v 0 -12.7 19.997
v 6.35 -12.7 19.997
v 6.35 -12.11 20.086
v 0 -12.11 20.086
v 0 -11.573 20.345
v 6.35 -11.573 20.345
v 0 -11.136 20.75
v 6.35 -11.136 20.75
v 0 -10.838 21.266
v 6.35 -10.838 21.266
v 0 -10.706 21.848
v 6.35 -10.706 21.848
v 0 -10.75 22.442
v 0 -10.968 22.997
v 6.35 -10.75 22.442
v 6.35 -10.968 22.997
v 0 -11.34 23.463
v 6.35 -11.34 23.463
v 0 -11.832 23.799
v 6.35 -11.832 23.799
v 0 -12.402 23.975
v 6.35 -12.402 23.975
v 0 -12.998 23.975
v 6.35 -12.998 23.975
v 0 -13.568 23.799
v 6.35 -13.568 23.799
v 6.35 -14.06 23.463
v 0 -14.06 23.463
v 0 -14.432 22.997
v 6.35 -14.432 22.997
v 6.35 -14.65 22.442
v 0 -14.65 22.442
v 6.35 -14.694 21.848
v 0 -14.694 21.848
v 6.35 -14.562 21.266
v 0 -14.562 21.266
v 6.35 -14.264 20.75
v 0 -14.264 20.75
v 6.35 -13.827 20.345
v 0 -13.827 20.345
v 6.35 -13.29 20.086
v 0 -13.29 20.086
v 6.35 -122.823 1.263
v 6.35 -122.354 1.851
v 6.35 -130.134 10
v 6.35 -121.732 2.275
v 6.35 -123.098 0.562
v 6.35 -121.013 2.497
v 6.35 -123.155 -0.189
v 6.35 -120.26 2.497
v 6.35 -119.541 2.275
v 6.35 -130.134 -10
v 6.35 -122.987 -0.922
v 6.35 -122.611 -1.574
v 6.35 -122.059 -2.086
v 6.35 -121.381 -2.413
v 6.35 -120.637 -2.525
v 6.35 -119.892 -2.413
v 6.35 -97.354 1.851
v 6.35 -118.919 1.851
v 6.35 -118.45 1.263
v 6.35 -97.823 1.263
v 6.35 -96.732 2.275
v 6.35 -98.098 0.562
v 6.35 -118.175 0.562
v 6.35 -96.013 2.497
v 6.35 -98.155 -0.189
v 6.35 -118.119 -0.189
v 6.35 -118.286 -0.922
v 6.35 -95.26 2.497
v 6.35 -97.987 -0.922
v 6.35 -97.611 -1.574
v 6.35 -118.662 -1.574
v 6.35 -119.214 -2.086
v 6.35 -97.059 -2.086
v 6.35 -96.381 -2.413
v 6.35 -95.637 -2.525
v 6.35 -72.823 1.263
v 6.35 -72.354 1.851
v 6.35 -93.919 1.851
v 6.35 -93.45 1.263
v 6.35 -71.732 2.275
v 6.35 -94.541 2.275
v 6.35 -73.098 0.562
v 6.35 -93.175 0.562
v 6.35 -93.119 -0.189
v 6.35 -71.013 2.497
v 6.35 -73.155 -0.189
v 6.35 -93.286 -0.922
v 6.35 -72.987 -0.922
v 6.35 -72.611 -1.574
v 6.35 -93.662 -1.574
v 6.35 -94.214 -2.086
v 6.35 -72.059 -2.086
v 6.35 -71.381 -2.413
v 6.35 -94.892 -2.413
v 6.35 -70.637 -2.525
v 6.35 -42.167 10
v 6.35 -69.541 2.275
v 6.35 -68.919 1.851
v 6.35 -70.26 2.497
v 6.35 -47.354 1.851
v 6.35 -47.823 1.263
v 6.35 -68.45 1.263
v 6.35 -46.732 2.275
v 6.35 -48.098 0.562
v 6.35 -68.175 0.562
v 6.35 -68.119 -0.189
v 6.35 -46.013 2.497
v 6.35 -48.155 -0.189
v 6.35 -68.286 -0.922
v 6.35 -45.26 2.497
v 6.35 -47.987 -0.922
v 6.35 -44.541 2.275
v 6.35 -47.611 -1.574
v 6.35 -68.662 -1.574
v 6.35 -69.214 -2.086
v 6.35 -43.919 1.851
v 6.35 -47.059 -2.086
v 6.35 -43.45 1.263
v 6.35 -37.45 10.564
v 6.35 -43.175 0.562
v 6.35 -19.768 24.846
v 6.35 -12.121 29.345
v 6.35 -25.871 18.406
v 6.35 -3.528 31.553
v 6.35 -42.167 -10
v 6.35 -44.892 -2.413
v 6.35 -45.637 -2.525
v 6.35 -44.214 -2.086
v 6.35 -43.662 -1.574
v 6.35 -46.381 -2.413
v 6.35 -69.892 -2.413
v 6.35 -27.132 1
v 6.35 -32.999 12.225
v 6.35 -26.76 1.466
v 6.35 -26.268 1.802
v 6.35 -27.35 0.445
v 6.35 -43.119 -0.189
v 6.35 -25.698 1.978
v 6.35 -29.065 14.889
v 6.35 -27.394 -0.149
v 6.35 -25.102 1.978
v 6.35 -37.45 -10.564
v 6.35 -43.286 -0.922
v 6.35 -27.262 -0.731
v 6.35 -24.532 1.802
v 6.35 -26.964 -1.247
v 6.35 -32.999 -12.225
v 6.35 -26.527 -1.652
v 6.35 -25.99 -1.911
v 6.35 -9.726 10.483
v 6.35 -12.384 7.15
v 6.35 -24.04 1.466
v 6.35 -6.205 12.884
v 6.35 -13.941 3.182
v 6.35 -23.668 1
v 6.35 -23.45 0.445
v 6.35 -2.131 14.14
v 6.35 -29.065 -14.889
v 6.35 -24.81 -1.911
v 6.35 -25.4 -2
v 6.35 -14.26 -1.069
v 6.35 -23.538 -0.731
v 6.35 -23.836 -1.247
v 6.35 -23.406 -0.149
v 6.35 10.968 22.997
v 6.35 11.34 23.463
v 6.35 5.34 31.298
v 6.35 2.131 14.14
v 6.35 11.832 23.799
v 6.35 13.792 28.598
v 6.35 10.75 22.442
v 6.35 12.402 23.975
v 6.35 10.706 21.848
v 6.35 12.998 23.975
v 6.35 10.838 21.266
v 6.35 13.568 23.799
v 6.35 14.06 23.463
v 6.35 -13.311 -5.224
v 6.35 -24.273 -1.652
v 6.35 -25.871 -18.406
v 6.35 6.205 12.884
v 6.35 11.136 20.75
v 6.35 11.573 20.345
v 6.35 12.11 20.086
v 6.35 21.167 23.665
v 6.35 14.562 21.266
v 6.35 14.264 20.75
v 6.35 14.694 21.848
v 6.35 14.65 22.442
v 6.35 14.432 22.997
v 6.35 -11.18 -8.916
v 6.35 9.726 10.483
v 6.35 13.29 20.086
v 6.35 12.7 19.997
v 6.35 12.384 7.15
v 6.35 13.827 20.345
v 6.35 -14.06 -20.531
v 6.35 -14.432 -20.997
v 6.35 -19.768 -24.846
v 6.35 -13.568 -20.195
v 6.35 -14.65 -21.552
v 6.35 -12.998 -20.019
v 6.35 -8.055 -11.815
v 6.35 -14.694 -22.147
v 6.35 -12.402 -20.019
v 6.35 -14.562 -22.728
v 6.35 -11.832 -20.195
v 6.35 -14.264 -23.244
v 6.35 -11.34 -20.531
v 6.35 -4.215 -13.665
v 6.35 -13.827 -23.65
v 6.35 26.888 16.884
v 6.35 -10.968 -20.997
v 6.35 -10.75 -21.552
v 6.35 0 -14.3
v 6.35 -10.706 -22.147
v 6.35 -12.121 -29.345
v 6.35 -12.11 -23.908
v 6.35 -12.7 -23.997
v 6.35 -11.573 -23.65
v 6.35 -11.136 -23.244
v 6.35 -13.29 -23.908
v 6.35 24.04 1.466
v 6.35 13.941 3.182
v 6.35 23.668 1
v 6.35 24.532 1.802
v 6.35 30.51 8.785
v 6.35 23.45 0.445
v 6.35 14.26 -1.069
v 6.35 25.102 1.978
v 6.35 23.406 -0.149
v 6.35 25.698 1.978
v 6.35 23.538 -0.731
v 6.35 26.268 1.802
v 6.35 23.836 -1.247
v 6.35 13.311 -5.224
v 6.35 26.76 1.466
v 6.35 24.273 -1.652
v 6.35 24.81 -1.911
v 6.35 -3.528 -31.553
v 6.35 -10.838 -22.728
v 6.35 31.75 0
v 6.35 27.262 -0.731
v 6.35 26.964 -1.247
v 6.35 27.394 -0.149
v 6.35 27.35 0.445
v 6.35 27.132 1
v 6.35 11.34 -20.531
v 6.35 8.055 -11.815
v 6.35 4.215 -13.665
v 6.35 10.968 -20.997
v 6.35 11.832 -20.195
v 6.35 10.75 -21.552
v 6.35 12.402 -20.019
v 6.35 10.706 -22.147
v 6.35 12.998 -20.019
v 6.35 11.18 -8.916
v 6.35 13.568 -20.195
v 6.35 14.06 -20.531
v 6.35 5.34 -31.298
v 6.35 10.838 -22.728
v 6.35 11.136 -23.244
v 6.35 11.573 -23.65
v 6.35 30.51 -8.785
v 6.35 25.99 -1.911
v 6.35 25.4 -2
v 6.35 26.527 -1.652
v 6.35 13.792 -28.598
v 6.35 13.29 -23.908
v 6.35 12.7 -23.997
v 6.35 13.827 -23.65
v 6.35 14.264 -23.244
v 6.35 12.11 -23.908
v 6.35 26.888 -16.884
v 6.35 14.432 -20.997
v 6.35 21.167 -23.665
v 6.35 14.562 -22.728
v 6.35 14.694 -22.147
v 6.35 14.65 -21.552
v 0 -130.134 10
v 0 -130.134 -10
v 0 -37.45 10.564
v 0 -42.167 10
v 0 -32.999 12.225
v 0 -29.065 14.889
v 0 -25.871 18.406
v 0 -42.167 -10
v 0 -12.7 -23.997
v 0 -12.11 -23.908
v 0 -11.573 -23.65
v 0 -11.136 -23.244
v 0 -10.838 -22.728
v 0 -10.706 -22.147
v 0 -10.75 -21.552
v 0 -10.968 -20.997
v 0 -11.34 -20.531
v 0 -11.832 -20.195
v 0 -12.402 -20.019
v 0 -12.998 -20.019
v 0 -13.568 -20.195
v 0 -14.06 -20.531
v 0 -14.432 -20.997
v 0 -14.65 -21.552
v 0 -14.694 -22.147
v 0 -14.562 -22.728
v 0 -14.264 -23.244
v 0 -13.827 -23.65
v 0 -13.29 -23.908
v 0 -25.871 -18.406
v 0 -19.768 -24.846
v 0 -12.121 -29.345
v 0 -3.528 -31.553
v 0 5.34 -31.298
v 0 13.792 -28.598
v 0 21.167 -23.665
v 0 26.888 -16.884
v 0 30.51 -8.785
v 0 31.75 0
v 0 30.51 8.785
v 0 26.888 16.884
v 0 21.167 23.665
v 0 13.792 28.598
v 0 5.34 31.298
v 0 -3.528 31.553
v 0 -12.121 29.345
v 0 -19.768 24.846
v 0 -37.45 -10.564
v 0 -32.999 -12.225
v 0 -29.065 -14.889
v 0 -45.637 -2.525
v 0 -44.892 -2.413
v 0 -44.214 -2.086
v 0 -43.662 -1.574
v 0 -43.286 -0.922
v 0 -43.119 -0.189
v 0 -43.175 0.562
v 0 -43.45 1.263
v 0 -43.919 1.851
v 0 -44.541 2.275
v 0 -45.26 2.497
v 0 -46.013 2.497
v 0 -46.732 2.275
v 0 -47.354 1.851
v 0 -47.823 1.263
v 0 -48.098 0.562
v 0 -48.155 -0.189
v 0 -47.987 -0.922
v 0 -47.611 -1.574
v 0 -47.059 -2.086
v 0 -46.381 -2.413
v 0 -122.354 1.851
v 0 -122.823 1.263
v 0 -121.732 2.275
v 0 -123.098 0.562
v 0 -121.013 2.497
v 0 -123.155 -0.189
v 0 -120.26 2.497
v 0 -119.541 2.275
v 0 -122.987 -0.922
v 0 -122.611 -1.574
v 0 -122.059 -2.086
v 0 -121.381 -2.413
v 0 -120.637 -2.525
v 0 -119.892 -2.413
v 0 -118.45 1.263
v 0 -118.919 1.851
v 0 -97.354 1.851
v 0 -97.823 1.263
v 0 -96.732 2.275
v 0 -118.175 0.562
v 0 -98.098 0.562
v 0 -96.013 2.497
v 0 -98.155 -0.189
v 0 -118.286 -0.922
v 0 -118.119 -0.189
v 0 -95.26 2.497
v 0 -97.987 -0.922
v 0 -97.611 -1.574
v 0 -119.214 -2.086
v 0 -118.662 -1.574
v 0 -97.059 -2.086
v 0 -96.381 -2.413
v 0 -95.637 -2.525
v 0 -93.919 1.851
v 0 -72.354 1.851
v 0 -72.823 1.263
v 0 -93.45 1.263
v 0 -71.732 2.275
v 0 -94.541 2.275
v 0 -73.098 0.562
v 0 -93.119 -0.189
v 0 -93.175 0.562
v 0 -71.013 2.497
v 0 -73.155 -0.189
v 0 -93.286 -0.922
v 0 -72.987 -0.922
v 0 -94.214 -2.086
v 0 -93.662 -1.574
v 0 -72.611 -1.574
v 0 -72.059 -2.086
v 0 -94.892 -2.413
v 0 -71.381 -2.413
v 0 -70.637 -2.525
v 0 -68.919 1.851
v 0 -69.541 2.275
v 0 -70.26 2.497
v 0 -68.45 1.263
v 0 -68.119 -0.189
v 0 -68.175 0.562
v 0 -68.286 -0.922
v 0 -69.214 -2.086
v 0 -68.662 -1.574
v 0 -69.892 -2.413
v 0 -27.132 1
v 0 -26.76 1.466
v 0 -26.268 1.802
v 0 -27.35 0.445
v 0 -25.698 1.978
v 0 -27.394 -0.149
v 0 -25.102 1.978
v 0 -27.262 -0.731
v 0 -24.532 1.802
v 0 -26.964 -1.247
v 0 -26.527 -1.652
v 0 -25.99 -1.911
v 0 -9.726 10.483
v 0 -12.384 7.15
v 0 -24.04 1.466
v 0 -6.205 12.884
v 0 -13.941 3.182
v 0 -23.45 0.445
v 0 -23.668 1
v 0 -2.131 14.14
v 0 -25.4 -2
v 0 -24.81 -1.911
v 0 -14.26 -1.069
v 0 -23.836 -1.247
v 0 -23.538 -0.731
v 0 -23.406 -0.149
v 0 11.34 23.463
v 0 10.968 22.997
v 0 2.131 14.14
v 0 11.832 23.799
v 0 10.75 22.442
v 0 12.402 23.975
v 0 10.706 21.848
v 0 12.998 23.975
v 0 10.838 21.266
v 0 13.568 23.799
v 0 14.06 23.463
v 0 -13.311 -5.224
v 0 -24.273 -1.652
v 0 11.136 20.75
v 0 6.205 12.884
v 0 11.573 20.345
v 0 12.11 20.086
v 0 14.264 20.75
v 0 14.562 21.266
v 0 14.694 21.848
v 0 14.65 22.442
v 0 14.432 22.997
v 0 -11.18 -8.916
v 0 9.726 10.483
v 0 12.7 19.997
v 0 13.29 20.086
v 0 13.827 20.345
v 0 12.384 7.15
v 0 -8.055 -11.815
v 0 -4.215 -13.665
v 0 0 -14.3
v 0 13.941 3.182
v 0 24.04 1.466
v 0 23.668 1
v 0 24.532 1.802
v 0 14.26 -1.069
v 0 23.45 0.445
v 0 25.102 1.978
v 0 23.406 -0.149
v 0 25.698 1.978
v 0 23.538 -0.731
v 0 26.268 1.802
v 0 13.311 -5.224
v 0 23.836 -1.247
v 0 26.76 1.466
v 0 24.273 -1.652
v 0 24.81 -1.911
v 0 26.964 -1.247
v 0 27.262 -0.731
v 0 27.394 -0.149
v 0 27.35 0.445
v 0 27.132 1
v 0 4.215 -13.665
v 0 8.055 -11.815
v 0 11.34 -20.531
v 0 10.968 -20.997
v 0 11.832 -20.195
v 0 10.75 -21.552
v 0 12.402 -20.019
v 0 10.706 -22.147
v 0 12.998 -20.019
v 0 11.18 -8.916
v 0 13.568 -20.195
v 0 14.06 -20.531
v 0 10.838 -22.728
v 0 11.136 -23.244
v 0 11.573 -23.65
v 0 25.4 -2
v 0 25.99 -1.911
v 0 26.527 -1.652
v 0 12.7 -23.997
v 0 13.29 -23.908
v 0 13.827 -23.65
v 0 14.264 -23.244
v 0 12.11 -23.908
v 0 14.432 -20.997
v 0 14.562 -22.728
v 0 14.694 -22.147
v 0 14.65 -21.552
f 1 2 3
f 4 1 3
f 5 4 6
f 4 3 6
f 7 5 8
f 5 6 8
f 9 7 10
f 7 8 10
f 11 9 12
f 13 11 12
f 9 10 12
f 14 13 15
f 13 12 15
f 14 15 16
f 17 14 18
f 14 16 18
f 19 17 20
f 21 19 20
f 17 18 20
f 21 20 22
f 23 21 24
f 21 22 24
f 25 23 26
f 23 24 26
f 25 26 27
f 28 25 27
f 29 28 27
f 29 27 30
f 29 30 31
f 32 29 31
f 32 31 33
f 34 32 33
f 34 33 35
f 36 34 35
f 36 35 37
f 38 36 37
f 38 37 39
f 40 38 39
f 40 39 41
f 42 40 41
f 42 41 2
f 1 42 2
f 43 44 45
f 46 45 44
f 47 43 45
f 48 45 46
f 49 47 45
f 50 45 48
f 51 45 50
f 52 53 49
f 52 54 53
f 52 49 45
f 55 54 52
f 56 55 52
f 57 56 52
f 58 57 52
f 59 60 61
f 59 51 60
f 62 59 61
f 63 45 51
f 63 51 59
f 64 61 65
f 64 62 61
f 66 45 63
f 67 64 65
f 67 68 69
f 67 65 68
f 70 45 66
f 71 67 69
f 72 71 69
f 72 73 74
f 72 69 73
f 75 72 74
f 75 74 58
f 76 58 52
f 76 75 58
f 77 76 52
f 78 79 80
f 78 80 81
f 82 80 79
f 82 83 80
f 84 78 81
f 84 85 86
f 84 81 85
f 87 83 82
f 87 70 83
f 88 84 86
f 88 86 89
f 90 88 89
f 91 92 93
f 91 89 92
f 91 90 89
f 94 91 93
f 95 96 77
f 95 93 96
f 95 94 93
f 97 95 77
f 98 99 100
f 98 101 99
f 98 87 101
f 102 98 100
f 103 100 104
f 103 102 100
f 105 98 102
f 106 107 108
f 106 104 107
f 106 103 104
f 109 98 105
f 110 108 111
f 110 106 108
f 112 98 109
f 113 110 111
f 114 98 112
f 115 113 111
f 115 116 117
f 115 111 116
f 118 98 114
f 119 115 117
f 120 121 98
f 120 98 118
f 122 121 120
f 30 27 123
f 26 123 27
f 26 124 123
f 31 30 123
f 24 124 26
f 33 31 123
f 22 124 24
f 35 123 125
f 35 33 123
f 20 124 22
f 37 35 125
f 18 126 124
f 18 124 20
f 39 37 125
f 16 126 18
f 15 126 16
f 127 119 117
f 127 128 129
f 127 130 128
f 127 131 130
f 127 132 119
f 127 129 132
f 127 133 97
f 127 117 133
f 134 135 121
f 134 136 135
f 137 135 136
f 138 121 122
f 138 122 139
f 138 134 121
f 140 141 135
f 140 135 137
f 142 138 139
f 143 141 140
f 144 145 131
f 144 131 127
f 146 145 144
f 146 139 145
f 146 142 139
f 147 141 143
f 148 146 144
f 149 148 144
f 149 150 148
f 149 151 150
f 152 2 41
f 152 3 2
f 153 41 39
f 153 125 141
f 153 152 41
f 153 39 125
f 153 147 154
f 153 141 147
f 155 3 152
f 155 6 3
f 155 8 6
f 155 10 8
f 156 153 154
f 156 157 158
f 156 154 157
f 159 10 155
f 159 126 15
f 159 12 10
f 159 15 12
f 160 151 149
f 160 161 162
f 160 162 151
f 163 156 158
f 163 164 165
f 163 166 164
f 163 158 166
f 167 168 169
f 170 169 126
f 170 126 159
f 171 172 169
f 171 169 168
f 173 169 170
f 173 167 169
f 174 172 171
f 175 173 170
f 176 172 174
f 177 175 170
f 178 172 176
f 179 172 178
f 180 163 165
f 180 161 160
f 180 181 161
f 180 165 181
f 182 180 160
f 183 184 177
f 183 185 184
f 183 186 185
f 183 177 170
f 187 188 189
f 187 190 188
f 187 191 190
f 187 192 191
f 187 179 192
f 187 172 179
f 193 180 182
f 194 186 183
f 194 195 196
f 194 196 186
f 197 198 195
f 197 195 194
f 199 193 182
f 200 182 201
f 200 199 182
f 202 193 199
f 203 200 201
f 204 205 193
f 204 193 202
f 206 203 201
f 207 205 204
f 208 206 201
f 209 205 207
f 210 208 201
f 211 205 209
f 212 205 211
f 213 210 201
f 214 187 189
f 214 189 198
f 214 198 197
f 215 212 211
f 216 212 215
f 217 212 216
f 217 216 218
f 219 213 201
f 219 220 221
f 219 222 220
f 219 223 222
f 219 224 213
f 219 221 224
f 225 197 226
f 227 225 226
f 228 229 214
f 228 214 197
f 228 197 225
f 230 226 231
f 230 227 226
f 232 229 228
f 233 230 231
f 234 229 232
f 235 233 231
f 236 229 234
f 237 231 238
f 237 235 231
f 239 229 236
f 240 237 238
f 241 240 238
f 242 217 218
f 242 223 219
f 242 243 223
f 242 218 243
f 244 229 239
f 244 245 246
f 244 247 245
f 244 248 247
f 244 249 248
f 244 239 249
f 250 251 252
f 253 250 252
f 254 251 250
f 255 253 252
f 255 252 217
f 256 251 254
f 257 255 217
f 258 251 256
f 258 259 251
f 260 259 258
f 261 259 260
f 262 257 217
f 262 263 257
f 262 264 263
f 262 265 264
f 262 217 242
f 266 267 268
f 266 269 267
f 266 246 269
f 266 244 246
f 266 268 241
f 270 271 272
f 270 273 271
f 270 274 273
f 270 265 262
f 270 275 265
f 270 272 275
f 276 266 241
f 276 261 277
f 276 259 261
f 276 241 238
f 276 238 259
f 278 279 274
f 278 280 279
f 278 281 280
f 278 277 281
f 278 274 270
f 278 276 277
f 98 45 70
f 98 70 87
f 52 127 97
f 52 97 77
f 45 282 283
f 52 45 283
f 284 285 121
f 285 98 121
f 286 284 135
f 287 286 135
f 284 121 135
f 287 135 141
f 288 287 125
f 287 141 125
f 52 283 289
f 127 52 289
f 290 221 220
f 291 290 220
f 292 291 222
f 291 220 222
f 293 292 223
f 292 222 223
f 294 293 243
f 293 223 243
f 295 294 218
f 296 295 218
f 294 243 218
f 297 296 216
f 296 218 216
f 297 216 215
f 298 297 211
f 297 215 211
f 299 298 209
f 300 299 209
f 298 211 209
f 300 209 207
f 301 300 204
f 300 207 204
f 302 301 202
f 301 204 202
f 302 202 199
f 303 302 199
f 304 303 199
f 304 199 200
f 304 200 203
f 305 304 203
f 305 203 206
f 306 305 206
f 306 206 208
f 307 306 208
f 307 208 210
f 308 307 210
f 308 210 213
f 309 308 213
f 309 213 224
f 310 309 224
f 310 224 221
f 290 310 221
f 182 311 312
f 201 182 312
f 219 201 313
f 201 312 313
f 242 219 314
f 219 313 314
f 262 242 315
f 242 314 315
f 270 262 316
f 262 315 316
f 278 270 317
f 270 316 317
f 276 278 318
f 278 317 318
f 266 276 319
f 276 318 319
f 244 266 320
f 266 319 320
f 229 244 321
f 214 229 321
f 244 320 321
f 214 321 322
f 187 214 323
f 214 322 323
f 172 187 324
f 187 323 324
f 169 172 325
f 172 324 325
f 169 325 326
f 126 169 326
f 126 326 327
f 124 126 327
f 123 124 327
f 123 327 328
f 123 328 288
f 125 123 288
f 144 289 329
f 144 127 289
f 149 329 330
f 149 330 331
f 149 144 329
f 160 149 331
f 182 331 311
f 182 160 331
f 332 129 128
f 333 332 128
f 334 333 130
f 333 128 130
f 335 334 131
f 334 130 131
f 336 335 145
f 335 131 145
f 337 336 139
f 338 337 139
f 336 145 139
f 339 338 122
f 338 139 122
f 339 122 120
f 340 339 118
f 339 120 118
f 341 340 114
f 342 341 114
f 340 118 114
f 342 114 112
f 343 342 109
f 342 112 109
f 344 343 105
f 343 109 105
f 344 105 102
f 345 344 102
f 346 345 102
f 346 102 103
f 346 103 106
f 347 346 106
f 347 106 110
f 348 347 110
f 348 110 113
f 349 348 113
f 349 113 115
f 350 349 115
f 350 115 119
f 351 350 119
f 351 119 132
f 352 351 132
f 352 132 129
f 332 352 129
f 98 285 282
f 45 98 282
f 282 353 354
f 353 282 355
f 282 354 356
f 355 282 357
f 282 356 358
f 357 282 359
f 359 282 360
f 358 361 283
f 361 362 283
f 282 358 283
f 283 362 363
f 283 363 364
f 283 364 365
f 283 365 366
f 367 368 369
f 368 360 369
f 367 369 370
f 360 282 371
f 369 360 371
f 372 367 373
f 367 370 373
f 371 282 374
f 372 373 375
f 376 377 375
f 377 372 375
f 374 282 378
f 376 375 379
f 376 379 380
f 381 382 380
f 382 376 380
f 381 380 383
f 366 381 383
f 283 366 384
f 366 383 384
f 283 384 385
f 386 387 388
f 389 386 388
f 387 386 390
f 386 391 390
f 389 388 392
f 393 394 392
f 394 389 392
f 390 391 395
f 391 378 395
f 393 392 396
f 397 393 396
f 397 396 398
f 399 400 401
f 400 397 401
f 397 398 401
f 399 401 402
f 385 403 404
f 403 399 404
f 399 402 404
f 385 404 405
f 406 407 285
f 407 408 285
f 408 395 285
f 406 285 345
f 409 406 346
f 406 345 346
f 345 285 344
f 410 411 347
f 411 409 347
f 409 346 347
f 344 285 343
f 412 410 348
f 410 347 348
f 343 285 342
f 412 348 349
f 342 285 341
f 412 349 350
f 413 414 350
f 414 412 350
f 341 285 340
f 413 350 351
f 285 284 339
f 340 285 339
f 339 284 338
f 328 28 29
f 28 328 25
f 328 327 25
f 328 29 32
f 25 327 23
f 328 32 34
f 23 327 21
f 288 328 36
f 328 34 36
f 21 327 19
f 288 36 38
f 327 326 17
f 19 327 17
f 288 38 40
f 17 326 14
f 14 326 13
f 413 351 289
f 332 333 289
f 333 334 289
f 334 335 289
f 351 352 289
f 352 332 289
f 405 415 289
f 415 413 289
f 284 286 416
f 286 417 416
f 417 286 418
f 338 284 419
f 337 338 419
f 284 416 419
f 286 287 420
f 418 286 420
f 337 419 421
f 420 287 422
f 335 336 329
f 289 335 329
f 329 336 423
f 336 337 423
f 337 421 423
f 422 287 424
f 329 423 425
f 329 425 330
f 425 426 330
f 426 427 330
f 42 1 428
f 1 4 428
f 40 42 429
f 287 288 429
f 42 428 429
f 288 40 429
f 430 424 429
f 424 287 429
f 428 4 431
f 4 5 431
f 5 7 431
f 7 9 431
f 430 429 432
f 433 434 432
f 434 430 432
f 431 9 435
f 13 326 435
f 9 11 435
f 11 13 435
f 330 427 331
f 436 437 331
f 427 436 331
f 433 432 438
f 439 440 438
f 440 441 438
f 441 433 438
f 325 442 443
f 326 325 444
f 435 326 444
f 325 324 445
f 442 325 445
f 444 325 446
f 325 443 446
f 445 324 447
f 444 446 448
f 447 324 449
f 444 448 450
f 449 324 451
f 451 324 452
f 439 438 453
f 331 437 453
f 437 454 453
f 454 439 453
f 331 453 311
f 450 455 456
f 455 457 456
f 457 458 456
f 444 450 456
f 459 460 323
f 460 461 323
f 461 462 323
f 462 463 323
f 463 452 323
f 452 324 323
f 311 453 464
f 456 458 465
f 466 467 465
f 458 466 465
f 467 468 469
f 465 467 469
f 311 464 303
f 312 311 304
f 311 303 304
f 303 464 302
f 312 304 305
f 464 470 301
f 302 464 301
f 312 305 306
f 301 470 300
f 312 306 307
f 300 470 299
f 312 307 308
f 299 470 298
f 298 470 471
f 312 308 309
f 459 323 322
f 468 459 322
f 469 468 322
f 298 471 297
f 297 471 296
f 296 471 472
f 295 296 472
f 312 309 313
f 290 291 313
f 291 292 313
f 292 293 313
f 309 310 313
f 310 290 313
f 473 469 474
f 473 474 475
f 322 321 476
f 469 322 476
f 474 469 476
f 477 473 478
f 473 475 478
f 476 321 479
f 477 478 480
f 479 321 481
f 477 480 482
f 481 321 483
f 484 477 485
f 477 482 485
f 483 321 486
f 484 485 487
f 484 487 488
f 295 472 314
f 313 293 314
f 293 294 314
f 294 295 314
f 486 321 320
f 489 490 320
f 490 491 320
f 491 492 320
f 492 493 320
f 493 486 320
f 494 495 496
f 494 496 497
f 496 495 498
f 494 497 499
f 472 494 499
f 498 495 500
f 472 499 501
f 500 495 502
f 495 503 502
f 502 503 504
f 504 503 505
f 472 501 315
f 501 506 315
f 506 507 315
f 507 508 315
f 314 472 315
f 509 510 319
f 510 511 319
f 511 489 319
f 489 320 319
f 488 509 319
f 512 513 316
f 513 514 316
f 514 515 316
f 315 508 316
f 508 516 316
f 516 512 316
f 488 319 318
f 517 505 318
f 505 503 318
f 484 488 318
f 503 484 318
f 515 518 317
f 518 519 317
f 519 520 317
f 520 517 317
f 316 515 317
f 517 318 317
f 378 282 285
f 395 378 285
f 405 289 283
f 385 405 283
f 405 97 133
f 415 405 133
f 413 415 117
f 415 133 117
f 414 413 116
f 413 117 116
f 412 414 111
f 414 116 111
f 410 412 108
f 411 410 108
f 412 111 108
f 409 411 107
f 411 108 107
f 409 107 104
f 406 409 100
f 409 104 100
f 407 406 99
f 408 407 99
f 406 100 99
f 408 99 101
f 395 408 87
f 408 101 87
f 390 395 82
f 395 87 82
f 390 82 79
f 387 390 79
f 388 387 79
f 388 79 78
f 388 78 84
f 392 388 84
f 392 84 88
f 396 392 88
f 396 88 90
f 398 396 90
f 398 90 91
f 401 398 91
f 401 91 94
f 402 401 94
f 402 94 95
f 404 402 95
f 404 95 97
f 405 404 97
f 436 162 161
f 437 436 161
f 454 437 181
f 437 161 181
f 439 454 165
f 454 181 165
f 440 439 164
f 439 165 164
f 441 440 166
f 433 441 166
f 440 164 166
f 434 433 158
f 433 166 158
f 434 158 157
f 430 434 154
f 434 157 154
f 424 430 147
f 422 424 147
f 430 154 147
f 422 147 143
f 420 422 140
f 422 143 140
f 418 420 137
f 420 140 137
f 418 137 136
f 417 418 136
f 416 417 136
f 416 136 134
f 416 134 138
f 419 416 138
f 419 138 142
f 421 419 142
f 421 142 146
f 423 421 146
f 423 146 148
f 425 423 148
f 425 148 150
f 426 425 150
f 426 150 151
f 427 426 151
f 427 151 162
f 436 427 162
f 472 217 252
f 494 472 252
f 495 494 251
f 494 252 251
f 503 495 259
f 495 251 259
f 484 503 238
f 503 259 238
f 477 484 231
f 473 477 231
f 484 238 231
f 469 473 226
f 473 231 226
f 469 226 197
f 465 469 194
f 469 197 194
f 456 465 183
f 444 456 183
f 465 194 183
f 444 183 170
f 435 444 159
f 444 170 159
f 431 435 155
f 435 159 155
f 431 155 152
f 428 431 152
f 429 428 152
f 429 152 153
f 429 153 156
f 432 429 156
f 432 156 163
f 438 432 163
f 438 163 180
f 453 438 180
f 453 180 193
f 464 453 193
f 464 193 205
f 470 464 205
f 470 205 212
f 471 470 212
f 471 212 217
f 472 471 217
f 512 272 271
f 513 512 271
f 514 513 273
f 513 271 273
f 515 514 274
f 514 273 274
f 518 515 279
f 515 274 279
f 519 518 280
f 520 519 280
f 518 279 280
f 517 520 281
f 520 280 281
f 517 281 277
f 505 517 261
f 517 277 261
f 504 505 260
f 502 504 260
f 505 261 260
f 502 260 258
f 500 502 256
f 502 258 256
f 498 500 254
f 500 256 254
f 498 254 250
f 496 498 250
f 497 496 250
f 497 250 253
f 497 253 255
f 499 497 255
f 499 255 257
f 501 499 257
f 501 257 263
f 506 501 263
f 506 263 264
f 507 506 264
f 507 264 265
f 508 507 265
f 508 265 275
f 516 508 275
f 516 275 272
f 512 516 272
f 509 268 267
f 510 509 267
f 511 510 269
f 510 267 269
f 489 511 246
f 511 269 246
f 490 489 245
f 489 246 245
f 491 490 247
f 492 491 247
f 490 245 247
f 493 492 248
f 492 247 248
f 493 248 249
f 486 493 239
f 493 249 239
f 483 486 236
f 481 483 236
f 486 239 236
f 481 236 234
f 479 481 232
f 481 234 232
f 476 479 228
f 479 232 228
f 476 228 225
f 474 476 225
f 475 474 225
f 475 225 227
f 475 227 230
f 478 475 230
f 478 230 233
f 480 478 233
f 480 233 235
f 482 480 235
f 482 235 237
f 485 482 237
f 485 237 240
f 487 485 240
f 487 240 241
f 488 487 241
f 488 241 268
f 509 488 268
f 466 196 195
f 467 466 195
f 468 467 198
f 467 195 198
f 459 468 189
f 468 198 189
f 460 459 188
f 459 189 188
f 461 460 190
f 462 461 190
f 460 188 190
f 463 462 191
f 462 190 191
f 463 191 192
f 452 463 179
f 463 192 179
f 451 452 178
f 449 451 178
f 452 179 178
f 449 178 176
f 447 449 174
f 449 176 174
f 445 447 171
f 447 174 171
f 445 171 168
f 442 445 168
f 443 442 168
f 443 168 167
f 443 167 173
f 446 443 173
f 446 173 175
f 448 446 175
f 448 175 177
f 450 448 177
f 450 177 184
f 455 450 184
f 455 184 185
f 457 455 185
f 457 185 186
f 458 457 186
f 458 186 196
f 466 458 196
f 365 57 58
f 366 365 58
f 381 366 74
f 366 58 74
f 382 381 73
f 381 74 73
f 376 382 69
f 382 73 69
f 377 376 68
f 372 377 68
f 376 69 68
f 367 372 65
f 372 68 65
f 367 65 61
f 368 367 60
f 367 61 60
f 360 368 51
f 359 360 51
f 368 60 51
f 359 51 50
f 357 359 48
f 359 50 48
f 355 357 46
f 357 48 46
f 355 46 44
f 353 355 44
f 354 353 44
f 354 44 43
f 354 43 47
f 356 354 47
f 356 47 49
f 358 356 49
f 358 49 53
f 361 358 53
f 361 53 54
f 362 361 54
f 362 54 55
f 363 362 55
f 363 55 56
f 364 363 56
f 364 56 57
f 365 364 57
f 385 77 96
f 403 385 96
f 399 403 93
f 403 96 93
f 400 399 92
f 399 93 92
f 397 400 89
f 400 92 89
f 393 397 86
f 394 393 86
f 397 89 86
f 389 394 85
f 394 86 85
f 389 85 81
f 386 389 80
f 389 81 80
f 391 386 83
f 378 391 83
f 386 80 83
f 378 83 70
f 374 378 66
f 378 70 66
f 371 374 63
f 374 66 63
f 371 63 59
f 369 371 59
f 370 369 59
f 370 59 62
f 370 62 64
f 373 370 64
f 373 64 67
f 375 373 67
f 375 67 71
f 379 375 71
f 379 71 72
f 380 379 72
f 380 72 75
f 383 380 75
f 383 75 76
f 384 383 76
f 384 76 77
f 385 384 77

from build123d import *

# Parameters (mm, degrees)
BOSS_EXTRUDE1_DEPTH = 6.35
FILLET1_R           = 20
SKETCH2_R           = 14.3
SKETCH2_R_2         = 2
CUT_EXTRUDE1_DEPTH  = 7.35
SKETCH3_R           = 2.525
CUT_EXTRUDE2_DEPTH  = 7.35


with BuildPart() as part:
    # Sketch1 → Boss-Extrude1 (new body)
    with BuildSketch(Plane(origin=(0, 0, 0), x_dir=(0, 0, -1), z_dir=(1, 0, 0))):
        with BuildLine():
            Line((-10, -30.134075396), (-10, -130.134075396))
            Line((-10, -130.134075396), (10, -130.134075396))
            Line((10, -130.134075396), (10, -30.134075396))
            ThreePointArc((10, -30.134075396), (0, 31.75), (-10, -30.134075396))
        make_face()
    extrude(amount=BOSS_EXTRUDE1_DEPTH)

    # Fillet1
    fillet1_edges = [part.edges().sort_by_distance(p)[0] for p in [
        (3.175, -30.134075396, -10),
        (3.175, -30.134075396, 10),
    ]]
    fillet(fillet1_edges, radius=FILLET1_R)

    # Sketch2 → Cut-Extrude1 (cut, through all)
    with BuildSketch(Plane(origin=(6.35, 0, 0), x_dir=(0, 0, -1), z_dir=(1, 0, 0))):
        Circle(SKETCH2_R)
        with Locations((0, 25.4)):
            Circle(SKETCH2_R_2)
        with Locations((21.997045256, 12.7)):
            Circle(SKETCH2_R_2)
        with Locations((21.997045256, -12.7)):
            Circle(SKETCH2_R_2)
        with Locations((0, -25.4)):
            Circle(SKETCH2_R_2)
        with Locations((-21.997045256, -12.7)):
            Circle(SKETCH2_R_2)
        with Locations((-21.997045256, 12.7)):
            Circle(SKETCH2_R_2)
    extrude(amount=-CUT_EXTRUDE1_DEPTH, mode=Mode.SUBTRACT)

    # Sketch3 → Cut-Extrude2 (cut, through all)
    with BuildSketch(Plane(origin=(6.35, 0, 0), x_dir=(0, 0, -1), z_dir=(1, 0, 0))):
        with Locations((0, -120.63662428)):
            Circle(SKETCH3_R)
        with Locations((0, -95.63662428)):
            Circle(SKETCH3_R)
        with Locations((0, -70.63662428)):
            Circle(SKETCH3_R)
        with Locations((0, -45.63662428)):
            Circle(SKETCH3_R)
    extrude(amount=-CUT_EXTRUDE2_DEPTH, mode=Mode.SUBTRACT)


solid = part.part
